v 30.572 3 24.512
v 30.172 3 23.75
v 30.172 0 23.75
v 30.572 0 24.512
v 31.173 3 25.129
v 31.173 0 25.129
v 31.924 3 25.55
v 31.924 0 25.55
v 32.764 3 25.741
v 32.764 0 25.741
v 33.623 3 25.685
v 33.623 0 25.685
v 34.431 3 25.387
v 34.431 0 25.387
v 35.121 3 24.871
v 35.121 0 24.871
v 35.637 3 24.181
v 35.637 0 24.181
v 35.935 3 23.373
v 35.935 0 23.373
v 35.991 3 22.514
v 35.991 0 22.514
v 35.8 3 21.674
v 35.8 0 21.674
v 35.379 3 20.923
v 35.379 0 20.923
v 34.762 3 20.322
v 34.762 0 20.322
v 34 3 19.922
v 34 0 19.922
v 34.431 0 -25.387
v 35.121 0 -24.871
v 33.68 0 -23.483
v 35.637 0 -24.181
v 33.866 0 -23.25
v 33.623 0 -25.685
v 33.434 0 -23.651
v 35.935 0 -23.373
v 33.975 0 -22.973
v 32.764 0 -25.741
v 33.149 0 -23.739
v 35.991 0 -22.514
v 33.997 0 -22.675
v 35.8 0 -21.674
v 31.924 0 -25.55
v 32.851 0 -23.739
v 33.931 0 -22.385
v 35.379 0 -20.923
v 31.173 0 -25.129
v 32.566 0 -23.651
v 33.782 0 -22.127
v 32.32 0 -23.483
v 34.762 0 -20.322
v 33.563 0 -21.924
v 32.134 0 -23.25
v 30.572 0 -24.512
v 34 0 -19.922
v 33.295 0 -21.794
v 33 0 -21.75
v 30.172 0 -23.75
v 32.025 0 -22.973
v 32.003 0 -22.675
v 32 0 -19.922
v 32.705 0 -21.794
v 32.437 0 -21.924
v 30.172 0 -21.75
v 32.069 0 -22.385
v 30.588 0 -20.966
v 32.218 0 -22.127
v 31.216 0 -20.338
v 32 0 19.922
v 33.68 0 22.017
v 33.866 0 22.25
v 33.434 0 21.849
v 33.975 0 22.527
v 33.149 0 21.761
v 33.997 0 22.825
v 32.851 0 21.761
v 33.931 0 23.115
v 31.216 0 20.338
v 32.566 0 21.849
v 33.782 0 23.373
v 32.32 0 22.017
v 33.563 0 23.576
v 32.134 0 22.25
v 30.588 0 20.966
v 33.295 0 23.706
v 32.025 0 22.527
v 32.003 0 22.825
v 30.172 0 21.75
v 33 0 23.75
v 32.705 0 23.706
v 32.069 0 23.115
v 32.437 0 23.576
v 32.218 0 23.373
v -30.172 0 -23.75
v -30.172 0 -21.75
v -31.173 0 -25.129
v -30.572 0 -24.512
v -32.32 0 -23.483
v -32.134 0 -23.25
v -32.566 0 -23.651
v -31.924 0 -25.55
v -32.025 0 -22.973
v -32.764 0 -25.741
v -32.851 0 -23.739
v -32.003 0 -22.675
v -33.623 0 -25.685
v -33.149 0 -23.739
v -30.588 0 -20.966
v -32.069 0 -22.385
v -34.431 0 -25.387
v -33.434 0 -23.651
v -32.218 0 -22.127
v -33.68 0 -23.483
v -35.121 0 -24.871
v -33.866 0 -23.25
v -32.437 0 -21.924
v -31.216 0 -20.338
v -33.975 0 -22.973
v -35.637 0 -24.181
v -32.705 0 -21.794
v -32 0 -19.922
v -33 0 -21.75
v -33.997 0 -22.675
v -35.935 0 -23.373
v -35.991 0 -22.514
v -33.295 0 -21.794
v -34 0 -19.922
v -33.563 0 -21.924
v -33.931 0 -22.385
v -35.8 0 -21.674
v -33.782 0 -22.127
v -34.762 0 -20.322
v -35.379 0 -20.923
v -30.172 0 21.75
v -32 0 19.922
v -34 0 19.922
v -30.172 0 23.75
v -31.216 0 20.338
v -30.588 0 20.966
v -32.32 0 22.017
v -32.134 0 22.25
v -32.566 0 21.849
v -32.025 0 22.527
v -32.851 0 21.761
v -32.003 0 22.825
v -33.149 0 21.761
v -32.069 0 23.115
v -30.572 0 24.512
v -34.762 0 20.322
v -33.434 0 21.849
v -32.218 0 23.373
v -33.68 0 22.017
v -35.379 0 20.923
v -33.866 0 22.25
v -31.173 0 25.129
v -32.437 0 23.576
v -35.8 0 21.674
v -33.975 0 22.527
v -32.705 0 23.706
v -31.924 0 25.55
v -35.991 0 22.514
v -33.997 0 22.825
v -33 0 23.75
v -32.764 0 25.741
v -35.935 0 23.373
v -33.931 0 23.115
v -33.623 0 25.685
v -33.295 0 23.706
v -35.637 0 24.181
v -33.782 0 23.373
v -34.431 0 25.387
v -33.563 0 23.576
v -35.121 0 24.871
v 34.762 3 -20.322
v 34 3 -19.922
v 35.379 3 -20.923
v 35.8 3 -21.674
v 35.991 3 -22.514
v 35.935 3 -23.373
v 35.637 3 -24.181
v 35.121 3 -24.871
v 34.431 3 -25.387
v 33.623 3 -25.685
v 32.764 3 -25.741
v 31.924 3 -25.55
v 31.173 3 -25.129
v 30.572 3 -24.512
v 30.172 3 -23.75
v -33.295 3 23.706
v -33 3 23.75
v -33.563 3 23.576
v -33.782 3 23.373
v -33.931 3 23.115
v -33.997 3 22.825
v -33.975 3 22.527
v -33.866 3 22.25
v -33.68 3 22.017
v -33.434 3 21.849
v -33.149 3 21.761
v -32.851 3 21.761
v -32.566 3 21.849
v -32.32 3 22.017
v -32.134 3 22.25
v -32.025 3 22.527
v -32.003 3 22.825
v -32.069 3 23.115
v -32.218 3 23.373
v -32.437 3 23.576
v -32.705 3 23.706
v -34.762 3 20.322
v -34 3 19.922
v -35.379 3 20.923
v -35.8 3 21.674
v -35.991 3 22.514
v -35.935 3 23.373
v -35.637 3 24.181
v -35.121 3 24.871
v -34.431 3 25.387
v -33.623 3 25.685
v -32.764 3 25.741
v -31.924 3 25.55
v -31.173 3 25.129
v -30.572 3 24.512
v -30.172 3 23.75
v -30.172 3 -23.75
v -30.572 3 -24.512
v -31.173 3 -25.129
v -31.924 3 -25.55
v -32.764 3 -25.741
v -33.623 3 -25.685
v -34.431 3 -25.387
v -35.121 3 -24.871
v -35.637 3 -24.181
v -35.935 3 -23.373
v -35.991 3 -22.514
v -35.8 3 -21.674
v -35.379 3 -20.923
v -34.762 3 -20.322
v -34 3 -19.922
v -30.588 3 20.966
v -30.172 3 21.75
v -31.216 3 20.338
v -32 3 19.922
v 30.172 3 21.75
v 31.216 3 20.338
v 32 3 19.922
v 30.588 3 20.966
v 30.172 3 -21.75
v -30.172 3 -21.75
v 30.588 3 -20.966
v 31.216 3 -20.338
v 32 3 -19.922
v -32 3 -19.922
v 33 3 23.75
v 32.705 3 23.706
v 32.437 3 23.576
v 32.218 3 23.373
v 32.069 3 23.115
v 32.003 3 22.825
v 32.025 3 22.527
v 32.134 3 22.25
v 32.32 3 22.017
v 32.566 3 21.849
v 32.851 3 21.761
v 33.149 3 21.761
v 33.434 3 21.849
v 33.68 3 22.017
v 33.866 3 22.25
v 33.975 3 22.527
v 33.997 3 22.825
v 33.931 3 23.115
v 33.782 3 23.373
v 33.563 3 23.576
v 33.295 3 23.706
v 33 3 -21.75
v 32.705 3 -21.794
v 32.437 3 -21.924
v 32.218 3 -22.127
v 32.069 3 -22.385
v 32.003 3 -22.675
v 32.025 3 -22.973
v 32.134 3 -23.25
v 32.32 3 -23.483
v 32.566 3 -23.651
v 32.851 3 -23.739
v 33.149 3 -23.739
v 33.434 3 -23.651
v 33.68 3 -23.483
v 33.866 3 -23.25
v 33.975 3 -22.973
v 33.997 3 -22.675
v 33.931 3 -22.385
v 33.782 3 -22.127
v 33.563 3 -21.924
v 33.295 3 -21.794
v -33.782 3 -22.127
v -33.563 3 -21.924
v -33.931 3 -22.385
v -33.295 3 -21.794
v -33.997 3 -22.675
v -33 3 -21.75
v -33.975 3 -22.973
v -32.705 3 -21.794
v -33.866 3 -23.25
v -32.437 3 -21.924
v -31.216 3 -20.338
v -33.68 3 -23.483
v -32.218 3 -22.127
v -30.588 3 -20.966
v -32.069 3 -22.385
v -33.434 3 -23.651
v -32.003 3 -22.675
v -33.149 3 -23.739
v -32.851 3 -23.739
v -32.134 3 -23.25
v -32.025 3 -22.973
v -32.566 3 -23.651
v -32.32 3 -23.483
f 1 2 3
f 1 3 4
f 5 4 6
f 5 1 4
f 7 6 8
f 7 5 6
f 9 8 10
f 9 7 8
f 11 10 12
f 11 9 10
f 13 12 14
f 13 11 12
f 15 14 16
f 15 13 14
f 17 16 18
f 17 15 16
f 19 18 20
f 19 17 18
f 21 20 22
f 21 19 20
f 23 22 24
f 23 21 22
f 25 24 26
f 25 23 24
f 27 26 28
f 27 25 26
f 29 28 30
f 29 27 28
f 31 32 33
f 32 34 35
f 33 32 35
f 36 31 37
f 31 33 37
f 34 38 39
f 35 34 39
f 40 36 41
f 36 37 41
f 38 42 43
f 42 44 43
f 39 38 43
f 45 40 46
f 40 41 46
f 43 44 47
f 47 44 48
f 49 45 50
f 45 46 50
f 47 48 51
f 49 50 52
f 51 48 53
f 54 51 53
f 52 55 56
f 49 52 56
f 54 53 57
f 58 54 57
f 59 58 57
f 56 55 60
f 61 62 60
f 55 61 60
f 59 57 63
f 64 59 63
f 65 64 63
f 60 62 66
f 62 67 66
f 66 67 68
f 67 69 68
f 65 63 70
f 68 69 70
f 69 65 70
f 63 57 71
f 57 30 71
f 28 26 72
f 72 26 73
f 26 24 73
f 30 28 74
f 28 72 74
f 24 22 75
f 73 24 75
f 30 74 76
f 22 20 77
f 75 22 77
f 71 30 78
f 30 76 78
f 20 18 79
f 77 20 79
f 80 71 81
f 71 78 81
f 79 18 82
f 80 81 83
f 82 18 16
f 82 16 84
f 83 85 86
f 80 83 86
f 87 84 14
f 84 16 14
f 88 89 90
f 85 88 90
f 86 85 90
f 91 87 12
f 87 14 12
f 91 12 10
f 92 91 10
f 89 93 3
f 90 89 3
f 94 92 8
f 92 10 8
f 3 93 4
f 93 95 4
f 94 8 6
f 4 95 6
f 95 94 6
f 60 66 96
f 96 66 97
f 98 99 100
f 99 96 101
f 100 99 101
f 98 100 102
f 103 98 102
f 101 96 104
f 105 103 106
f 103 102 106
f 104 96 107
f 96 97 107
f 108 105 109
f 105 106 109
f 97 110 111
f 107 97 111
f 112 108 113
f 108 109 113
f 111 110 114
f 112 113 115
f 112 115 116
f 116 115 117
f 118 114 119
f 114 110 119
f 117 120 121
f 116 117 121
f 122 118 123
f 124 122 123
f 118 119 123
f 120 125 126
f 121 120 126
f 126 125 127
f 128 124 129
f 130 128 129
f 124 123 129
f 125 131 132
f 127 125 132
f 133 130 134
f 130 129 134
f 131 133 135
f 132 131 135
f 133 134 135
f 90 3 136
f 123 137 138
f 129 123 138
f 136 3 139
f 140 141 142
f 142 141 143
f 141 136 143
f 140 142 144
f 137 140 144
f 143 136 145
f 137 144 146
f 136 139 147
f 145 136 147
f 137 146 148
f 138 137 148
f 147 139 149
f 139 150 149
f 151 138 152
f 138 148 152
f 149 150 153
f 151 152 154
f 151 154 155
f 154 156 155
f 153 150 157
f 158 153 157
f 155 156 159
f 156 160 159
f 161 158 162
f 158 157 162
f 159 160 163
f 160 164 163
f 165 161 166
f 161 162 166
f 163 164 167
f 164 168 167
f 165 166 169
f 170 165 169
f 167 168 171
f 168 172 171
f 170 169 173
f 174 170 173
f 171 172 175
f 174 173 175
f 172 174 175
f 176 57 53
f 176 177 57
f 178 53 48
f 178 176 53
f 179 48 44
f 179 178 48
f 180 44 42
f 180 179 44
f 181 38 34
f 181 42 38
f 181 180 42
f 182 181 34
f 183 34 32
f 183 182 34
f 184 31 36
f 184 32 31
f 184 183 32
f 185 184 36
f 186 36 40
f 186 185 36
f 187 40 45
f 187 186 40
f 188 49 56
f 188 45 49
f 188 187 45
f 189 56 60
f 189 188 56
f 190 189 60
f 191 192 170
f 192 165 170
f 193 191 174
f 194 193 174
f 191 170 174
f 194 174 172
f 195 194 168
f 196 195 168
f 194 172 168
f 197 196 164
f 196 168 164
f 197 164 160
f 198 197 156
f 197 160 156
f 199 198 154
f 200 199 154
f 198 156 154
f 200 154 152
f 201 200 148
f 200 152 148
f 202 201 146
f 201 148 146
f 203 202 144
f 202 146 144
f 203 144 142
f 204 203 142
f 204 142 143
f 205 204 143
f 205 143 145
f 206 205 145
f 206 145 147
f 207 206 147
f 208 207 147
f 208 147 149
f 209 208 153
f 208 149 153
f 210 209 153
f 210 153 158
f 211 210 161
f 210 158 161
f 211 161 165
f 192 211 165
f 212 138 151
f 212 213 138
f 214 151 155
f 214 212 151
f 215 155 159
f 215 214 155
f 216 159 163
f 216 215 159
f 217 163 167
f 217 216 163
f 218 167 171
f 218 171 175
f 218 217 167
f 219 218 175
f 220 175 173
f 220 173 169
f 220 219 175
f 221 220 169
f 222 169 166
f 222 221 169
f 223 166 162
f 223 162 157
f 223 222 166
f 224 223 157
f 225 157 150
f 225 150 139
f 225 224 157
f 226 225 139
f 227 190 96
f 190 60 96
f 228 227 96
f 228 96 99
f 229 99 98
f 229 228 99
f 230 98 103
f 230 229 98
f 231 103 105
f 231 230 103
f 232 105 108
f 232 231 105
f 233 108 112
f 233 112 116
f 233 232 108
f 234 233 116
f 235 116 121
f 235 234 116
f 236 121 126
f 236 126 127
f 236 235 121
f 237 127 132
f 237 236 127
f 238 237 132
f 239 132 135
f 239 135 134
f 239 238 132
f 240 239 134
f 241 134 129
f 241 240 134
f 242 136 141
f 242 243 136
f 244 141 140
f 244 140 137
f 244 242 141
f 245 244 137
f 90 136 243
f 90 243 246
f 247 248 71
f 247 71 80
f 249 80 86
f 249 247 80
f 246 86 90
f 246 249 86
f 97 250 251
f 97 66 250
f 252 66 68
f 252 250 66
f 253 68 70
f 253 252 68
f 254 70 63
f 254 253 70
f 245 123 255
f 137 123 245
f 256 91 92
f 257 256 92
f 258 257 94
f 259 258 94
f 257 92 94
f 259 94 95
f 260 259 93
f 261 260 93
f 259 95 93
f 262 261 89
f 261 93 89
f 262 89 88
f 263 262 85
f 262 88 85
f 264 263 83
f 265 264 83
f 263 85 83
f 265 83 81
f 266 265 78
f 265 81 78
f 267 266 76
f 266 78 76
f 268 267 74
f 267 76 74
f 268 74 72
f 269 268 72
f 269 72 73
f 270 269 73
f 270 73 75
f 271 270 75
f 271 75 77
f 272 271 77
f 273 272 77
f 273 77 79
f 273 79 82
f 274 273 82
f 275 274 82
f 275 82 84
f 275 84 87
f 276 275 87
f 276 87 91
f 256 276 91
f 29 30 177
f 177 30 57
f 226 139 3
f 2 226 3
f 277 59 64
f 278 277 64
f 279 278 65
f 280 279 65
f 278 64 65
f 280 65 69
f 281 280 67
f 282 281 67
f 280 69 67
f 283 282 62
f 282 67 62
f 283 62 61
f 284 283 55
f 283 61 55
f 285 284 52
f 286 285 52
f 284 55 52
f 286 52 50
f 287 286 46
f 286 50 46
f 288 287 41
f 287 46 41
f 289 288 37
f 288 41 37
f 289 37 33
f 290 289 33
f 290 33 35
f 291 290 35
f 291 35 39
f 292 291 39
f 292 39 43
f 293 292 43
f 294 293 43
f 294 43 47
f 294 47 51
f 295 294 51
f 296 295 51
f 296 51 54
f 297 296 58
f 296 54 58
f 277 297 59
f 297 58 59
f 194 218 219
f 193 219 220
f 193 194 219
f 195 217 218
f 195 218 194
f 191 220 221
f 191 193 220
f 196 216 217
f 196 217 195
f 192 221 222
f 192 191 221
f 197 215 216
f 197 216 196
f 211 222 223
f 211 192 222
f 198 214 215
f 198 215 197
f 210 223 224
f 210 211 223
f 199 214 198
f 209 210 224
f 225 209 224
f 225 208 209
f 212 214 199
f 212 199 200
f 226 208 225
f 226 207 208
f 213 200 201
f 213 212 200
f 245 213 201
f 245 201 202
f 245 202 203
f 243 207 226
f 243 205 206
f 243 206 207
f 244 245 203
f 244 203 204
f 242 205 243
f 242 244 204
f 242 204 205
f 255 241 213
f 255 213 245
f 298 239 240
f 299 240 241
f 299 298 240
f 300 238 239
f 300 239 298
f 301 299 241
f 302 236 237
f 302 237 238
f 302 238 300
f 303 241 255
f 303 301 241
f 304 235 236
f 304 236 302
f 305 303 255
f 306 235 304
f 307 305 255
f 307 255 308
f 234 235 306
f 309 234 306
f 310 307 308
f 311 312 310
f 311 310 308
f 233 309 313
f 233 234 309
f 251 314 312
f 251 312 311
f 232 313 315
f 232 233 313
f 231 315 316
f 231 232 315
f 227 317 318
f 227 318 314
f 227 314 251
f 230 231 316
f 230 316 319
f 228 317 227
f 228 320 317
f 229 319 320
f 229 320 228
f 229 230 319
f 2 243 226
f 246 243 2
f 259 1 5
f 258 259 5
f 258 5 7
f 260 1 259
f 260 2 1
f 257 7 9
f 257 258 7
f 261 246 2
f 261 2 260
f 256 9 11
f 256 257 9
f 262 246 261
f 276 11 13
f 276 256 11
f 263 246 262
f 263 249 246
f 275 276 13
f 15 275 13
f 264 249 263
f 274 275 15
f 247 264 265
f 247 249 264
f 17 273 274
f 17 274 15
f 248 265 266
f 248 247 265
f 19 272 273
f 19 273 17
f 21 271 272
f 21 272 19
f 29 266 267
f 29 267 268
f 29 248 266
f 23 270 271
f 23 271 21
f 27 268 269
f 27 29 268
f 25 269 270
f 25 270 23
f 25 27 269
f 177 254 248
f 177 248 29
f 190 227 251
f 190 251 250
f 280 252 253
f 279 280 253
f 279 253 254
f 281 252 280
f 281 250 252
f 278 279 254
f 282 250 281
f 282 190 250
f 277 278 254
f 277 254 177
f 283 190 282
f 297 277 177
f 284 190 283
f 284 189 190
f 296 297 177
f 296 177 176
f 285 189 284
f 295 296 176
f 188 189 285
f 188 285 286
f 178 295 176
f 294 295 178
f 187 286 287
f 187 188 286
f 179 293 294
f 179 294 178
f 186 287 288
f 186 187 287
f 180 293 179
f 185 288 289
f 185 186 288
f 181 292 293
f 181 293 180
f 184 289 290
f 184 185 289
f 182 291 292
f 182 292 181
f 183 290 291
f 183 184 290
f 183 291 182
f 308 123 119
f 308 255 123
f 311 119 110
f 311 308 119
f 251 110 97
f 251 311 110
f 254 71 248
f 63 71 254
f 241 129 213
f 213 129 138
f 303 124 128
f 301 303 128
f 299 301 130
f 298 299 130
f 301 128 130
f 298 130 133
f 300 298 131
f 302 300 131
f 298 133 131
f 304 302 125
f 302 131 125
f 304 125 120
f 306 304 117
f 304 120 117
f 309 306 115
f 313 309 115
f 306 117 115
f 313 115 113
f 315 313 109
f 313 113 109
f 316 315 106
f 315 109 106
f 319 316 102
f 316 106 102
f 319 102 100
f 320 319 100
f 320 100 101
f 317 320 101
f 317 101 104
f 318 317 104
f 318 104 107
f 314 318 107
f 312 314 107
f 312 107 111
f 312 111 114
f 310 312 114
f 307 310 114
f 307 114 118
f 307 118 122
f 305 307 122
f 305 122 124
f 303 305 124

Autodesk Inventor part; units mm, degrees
ref_plane "YZ Plane" through (0, 0, 0) normal (1, 0, 0) x (0, 1, 0)
ref_plane "XZ Plane" through (0, 0, 0) normal (0, 1, 0) x (-1, 0, 0)
ref_plane "XY Plane" through (0, 0, 0) normal (0, 0, 1) x (1, 0, 0)
sketch "Sketch1" plane through (0, 0, 0) normal (0, 1, 0) x (-1, 0, 0)
  line L0 (-33, 22.75) -> (33, 22.75) construction
  line L1 (33, 22.75) -> (33, -22.75) construction
  line L2 (33, -22.75) -> (-33, -22.75) construction
  line L3 (-33, -22.75) -> (-33, 22.75) construction
  line L4 (-33, 22.75) -> (33, -22.75) construction
  line L5 (33, 22.75) -> (-33, -22.75) construction
  line L6 (32, -21.75) -> (32, 21.75)
  line L7 (32, 21.75) -> (-32, 21.75)
  line L8 (-32, 21.75) -> (-32, -21.75)
  line L9 (-32, -21.75) -> (32, -21.75)
  line L10 (34, -23.75) -> (34, 23.75)
  line L11 (34, 23.75) -> (-34, 23.75)
  line L12 (-34, 23.75) -> (-34, -23.75)
  line L13 (-34, -23.75) -> (34, -23.75)
  point P0 (0, 0)
  dimension "d0" = 45.5
  dimension "d1" = 66
  dimension "d18" = 1
  dimension "d19" = 1
extrude "Extrusion1" add sketch "Sketch1" along normal blind 3
sketch "Sketch4" plane through (0, 3, 0) normal (0, 1, 0) x (1, 0, 0)
  line L0 (-32, -21.75) -> (-32, 21.75) construction
  line L1 (-34, 23.75) -> (-32, 21.75) construction
  line L2 (33, -22.75) -> (-33, -22.75) construction
  line L3 (-33, -22.75) -> (-33, 22.75) construction
  line L4 (-33, 22.75) -> (33, 22.75) construction
  line L5 (33, 22.75) -> (33, -22.75) construction
  line L6 (33, -22.75) -> (-33, 22.75) construction
  line L7 (-33, -22.75) -> (33, 22.75) construction
  circle A0 centre (-33, 22.75) radius 3
  circle A1 centre (33, 22.75) radius 3
  circle A2 centre (-33, -22.75) radius 3
  circle A3 centre (33, -22.75) radius 3
  point P0 (0, 0)
  dimension "d20" = 6
  dimension "d21" = 6
  dimension "d22" = 6
  dimension "d23" = 6
extrude "Extrusion3" add sketch "Sketch4" against normal up to surface (3 mm away)
sketch "Sketch5" plane through (0, 3, 0) normal (0, 1, 0) x (1, 0, 0)
  line L0 (-30.1716, -23.75) -> (30.1716, -23.75) projected
  arc A0 (30.1716, -23.75) -> (34, -19.9216) centre (33, -22.75) ccw projected
  line L1 (34, -19.9216) -> (34, 19.9216) projected
  arc A1 (34, 19.9216) -> (30.1716, 23.75) centre (33, 22.75) ccw projected
  line L2 (30.1716, 23.75) -> (-30.1716, 23.75) projected
  arc A2 (-30.1716, 23.75) -> (-34, 19.9216) centre (-33, 22.75) ccw projected
  line L3 (-34, 19.9216) -> (-34, -19.9216) projected
  arc A3 (-34, -19.9216) -> (-30.1716, -23.75) centre (-33, -22.75) ccw projected
  arc A4 (-30.1716, -21.75) -> (-32, -19.9216) centre (-33, -22.75) ccw projected
  line L4 (-32, -19.9216) -> (-32, 19.9216) projected
  arc A5 (-32, 19.9216) -> (-30.1716, 21.75) centre (-33, 22.75) ccw projected
  line L5 (-30.1716, 21.75) -> (30.1716, 21.75) projected
  arc A6 (30.1716, 21.75) -> (32, 19.9216) centre (33, 22.75) ccw projected
  line L6 (32, 19.9216) -> (32, -19.9216) projected
  arc A7 (32, -19.9216) -> (30.1716, -21.75) centre (33, -22.75) ccw projected
  line L7 (30.1716, -21.75) -> (-30.1716, -21.75) projected
  point P0 (0, 0)
hole "Hole2" at (-33, 3, -22.75) at (33, 3, -22.75) at (-33, 3, 22.75) at (33, 3, 22.75) direction (0, -1, 0) diameter 2 depth 25 tip angle 118
equation "\"d18\" = d19"
equation "\"d21\" = d20"
equation "\"d22\" = d20"
equation "\"d23\" = d20"
properties part number "soporte_placa_separador"
